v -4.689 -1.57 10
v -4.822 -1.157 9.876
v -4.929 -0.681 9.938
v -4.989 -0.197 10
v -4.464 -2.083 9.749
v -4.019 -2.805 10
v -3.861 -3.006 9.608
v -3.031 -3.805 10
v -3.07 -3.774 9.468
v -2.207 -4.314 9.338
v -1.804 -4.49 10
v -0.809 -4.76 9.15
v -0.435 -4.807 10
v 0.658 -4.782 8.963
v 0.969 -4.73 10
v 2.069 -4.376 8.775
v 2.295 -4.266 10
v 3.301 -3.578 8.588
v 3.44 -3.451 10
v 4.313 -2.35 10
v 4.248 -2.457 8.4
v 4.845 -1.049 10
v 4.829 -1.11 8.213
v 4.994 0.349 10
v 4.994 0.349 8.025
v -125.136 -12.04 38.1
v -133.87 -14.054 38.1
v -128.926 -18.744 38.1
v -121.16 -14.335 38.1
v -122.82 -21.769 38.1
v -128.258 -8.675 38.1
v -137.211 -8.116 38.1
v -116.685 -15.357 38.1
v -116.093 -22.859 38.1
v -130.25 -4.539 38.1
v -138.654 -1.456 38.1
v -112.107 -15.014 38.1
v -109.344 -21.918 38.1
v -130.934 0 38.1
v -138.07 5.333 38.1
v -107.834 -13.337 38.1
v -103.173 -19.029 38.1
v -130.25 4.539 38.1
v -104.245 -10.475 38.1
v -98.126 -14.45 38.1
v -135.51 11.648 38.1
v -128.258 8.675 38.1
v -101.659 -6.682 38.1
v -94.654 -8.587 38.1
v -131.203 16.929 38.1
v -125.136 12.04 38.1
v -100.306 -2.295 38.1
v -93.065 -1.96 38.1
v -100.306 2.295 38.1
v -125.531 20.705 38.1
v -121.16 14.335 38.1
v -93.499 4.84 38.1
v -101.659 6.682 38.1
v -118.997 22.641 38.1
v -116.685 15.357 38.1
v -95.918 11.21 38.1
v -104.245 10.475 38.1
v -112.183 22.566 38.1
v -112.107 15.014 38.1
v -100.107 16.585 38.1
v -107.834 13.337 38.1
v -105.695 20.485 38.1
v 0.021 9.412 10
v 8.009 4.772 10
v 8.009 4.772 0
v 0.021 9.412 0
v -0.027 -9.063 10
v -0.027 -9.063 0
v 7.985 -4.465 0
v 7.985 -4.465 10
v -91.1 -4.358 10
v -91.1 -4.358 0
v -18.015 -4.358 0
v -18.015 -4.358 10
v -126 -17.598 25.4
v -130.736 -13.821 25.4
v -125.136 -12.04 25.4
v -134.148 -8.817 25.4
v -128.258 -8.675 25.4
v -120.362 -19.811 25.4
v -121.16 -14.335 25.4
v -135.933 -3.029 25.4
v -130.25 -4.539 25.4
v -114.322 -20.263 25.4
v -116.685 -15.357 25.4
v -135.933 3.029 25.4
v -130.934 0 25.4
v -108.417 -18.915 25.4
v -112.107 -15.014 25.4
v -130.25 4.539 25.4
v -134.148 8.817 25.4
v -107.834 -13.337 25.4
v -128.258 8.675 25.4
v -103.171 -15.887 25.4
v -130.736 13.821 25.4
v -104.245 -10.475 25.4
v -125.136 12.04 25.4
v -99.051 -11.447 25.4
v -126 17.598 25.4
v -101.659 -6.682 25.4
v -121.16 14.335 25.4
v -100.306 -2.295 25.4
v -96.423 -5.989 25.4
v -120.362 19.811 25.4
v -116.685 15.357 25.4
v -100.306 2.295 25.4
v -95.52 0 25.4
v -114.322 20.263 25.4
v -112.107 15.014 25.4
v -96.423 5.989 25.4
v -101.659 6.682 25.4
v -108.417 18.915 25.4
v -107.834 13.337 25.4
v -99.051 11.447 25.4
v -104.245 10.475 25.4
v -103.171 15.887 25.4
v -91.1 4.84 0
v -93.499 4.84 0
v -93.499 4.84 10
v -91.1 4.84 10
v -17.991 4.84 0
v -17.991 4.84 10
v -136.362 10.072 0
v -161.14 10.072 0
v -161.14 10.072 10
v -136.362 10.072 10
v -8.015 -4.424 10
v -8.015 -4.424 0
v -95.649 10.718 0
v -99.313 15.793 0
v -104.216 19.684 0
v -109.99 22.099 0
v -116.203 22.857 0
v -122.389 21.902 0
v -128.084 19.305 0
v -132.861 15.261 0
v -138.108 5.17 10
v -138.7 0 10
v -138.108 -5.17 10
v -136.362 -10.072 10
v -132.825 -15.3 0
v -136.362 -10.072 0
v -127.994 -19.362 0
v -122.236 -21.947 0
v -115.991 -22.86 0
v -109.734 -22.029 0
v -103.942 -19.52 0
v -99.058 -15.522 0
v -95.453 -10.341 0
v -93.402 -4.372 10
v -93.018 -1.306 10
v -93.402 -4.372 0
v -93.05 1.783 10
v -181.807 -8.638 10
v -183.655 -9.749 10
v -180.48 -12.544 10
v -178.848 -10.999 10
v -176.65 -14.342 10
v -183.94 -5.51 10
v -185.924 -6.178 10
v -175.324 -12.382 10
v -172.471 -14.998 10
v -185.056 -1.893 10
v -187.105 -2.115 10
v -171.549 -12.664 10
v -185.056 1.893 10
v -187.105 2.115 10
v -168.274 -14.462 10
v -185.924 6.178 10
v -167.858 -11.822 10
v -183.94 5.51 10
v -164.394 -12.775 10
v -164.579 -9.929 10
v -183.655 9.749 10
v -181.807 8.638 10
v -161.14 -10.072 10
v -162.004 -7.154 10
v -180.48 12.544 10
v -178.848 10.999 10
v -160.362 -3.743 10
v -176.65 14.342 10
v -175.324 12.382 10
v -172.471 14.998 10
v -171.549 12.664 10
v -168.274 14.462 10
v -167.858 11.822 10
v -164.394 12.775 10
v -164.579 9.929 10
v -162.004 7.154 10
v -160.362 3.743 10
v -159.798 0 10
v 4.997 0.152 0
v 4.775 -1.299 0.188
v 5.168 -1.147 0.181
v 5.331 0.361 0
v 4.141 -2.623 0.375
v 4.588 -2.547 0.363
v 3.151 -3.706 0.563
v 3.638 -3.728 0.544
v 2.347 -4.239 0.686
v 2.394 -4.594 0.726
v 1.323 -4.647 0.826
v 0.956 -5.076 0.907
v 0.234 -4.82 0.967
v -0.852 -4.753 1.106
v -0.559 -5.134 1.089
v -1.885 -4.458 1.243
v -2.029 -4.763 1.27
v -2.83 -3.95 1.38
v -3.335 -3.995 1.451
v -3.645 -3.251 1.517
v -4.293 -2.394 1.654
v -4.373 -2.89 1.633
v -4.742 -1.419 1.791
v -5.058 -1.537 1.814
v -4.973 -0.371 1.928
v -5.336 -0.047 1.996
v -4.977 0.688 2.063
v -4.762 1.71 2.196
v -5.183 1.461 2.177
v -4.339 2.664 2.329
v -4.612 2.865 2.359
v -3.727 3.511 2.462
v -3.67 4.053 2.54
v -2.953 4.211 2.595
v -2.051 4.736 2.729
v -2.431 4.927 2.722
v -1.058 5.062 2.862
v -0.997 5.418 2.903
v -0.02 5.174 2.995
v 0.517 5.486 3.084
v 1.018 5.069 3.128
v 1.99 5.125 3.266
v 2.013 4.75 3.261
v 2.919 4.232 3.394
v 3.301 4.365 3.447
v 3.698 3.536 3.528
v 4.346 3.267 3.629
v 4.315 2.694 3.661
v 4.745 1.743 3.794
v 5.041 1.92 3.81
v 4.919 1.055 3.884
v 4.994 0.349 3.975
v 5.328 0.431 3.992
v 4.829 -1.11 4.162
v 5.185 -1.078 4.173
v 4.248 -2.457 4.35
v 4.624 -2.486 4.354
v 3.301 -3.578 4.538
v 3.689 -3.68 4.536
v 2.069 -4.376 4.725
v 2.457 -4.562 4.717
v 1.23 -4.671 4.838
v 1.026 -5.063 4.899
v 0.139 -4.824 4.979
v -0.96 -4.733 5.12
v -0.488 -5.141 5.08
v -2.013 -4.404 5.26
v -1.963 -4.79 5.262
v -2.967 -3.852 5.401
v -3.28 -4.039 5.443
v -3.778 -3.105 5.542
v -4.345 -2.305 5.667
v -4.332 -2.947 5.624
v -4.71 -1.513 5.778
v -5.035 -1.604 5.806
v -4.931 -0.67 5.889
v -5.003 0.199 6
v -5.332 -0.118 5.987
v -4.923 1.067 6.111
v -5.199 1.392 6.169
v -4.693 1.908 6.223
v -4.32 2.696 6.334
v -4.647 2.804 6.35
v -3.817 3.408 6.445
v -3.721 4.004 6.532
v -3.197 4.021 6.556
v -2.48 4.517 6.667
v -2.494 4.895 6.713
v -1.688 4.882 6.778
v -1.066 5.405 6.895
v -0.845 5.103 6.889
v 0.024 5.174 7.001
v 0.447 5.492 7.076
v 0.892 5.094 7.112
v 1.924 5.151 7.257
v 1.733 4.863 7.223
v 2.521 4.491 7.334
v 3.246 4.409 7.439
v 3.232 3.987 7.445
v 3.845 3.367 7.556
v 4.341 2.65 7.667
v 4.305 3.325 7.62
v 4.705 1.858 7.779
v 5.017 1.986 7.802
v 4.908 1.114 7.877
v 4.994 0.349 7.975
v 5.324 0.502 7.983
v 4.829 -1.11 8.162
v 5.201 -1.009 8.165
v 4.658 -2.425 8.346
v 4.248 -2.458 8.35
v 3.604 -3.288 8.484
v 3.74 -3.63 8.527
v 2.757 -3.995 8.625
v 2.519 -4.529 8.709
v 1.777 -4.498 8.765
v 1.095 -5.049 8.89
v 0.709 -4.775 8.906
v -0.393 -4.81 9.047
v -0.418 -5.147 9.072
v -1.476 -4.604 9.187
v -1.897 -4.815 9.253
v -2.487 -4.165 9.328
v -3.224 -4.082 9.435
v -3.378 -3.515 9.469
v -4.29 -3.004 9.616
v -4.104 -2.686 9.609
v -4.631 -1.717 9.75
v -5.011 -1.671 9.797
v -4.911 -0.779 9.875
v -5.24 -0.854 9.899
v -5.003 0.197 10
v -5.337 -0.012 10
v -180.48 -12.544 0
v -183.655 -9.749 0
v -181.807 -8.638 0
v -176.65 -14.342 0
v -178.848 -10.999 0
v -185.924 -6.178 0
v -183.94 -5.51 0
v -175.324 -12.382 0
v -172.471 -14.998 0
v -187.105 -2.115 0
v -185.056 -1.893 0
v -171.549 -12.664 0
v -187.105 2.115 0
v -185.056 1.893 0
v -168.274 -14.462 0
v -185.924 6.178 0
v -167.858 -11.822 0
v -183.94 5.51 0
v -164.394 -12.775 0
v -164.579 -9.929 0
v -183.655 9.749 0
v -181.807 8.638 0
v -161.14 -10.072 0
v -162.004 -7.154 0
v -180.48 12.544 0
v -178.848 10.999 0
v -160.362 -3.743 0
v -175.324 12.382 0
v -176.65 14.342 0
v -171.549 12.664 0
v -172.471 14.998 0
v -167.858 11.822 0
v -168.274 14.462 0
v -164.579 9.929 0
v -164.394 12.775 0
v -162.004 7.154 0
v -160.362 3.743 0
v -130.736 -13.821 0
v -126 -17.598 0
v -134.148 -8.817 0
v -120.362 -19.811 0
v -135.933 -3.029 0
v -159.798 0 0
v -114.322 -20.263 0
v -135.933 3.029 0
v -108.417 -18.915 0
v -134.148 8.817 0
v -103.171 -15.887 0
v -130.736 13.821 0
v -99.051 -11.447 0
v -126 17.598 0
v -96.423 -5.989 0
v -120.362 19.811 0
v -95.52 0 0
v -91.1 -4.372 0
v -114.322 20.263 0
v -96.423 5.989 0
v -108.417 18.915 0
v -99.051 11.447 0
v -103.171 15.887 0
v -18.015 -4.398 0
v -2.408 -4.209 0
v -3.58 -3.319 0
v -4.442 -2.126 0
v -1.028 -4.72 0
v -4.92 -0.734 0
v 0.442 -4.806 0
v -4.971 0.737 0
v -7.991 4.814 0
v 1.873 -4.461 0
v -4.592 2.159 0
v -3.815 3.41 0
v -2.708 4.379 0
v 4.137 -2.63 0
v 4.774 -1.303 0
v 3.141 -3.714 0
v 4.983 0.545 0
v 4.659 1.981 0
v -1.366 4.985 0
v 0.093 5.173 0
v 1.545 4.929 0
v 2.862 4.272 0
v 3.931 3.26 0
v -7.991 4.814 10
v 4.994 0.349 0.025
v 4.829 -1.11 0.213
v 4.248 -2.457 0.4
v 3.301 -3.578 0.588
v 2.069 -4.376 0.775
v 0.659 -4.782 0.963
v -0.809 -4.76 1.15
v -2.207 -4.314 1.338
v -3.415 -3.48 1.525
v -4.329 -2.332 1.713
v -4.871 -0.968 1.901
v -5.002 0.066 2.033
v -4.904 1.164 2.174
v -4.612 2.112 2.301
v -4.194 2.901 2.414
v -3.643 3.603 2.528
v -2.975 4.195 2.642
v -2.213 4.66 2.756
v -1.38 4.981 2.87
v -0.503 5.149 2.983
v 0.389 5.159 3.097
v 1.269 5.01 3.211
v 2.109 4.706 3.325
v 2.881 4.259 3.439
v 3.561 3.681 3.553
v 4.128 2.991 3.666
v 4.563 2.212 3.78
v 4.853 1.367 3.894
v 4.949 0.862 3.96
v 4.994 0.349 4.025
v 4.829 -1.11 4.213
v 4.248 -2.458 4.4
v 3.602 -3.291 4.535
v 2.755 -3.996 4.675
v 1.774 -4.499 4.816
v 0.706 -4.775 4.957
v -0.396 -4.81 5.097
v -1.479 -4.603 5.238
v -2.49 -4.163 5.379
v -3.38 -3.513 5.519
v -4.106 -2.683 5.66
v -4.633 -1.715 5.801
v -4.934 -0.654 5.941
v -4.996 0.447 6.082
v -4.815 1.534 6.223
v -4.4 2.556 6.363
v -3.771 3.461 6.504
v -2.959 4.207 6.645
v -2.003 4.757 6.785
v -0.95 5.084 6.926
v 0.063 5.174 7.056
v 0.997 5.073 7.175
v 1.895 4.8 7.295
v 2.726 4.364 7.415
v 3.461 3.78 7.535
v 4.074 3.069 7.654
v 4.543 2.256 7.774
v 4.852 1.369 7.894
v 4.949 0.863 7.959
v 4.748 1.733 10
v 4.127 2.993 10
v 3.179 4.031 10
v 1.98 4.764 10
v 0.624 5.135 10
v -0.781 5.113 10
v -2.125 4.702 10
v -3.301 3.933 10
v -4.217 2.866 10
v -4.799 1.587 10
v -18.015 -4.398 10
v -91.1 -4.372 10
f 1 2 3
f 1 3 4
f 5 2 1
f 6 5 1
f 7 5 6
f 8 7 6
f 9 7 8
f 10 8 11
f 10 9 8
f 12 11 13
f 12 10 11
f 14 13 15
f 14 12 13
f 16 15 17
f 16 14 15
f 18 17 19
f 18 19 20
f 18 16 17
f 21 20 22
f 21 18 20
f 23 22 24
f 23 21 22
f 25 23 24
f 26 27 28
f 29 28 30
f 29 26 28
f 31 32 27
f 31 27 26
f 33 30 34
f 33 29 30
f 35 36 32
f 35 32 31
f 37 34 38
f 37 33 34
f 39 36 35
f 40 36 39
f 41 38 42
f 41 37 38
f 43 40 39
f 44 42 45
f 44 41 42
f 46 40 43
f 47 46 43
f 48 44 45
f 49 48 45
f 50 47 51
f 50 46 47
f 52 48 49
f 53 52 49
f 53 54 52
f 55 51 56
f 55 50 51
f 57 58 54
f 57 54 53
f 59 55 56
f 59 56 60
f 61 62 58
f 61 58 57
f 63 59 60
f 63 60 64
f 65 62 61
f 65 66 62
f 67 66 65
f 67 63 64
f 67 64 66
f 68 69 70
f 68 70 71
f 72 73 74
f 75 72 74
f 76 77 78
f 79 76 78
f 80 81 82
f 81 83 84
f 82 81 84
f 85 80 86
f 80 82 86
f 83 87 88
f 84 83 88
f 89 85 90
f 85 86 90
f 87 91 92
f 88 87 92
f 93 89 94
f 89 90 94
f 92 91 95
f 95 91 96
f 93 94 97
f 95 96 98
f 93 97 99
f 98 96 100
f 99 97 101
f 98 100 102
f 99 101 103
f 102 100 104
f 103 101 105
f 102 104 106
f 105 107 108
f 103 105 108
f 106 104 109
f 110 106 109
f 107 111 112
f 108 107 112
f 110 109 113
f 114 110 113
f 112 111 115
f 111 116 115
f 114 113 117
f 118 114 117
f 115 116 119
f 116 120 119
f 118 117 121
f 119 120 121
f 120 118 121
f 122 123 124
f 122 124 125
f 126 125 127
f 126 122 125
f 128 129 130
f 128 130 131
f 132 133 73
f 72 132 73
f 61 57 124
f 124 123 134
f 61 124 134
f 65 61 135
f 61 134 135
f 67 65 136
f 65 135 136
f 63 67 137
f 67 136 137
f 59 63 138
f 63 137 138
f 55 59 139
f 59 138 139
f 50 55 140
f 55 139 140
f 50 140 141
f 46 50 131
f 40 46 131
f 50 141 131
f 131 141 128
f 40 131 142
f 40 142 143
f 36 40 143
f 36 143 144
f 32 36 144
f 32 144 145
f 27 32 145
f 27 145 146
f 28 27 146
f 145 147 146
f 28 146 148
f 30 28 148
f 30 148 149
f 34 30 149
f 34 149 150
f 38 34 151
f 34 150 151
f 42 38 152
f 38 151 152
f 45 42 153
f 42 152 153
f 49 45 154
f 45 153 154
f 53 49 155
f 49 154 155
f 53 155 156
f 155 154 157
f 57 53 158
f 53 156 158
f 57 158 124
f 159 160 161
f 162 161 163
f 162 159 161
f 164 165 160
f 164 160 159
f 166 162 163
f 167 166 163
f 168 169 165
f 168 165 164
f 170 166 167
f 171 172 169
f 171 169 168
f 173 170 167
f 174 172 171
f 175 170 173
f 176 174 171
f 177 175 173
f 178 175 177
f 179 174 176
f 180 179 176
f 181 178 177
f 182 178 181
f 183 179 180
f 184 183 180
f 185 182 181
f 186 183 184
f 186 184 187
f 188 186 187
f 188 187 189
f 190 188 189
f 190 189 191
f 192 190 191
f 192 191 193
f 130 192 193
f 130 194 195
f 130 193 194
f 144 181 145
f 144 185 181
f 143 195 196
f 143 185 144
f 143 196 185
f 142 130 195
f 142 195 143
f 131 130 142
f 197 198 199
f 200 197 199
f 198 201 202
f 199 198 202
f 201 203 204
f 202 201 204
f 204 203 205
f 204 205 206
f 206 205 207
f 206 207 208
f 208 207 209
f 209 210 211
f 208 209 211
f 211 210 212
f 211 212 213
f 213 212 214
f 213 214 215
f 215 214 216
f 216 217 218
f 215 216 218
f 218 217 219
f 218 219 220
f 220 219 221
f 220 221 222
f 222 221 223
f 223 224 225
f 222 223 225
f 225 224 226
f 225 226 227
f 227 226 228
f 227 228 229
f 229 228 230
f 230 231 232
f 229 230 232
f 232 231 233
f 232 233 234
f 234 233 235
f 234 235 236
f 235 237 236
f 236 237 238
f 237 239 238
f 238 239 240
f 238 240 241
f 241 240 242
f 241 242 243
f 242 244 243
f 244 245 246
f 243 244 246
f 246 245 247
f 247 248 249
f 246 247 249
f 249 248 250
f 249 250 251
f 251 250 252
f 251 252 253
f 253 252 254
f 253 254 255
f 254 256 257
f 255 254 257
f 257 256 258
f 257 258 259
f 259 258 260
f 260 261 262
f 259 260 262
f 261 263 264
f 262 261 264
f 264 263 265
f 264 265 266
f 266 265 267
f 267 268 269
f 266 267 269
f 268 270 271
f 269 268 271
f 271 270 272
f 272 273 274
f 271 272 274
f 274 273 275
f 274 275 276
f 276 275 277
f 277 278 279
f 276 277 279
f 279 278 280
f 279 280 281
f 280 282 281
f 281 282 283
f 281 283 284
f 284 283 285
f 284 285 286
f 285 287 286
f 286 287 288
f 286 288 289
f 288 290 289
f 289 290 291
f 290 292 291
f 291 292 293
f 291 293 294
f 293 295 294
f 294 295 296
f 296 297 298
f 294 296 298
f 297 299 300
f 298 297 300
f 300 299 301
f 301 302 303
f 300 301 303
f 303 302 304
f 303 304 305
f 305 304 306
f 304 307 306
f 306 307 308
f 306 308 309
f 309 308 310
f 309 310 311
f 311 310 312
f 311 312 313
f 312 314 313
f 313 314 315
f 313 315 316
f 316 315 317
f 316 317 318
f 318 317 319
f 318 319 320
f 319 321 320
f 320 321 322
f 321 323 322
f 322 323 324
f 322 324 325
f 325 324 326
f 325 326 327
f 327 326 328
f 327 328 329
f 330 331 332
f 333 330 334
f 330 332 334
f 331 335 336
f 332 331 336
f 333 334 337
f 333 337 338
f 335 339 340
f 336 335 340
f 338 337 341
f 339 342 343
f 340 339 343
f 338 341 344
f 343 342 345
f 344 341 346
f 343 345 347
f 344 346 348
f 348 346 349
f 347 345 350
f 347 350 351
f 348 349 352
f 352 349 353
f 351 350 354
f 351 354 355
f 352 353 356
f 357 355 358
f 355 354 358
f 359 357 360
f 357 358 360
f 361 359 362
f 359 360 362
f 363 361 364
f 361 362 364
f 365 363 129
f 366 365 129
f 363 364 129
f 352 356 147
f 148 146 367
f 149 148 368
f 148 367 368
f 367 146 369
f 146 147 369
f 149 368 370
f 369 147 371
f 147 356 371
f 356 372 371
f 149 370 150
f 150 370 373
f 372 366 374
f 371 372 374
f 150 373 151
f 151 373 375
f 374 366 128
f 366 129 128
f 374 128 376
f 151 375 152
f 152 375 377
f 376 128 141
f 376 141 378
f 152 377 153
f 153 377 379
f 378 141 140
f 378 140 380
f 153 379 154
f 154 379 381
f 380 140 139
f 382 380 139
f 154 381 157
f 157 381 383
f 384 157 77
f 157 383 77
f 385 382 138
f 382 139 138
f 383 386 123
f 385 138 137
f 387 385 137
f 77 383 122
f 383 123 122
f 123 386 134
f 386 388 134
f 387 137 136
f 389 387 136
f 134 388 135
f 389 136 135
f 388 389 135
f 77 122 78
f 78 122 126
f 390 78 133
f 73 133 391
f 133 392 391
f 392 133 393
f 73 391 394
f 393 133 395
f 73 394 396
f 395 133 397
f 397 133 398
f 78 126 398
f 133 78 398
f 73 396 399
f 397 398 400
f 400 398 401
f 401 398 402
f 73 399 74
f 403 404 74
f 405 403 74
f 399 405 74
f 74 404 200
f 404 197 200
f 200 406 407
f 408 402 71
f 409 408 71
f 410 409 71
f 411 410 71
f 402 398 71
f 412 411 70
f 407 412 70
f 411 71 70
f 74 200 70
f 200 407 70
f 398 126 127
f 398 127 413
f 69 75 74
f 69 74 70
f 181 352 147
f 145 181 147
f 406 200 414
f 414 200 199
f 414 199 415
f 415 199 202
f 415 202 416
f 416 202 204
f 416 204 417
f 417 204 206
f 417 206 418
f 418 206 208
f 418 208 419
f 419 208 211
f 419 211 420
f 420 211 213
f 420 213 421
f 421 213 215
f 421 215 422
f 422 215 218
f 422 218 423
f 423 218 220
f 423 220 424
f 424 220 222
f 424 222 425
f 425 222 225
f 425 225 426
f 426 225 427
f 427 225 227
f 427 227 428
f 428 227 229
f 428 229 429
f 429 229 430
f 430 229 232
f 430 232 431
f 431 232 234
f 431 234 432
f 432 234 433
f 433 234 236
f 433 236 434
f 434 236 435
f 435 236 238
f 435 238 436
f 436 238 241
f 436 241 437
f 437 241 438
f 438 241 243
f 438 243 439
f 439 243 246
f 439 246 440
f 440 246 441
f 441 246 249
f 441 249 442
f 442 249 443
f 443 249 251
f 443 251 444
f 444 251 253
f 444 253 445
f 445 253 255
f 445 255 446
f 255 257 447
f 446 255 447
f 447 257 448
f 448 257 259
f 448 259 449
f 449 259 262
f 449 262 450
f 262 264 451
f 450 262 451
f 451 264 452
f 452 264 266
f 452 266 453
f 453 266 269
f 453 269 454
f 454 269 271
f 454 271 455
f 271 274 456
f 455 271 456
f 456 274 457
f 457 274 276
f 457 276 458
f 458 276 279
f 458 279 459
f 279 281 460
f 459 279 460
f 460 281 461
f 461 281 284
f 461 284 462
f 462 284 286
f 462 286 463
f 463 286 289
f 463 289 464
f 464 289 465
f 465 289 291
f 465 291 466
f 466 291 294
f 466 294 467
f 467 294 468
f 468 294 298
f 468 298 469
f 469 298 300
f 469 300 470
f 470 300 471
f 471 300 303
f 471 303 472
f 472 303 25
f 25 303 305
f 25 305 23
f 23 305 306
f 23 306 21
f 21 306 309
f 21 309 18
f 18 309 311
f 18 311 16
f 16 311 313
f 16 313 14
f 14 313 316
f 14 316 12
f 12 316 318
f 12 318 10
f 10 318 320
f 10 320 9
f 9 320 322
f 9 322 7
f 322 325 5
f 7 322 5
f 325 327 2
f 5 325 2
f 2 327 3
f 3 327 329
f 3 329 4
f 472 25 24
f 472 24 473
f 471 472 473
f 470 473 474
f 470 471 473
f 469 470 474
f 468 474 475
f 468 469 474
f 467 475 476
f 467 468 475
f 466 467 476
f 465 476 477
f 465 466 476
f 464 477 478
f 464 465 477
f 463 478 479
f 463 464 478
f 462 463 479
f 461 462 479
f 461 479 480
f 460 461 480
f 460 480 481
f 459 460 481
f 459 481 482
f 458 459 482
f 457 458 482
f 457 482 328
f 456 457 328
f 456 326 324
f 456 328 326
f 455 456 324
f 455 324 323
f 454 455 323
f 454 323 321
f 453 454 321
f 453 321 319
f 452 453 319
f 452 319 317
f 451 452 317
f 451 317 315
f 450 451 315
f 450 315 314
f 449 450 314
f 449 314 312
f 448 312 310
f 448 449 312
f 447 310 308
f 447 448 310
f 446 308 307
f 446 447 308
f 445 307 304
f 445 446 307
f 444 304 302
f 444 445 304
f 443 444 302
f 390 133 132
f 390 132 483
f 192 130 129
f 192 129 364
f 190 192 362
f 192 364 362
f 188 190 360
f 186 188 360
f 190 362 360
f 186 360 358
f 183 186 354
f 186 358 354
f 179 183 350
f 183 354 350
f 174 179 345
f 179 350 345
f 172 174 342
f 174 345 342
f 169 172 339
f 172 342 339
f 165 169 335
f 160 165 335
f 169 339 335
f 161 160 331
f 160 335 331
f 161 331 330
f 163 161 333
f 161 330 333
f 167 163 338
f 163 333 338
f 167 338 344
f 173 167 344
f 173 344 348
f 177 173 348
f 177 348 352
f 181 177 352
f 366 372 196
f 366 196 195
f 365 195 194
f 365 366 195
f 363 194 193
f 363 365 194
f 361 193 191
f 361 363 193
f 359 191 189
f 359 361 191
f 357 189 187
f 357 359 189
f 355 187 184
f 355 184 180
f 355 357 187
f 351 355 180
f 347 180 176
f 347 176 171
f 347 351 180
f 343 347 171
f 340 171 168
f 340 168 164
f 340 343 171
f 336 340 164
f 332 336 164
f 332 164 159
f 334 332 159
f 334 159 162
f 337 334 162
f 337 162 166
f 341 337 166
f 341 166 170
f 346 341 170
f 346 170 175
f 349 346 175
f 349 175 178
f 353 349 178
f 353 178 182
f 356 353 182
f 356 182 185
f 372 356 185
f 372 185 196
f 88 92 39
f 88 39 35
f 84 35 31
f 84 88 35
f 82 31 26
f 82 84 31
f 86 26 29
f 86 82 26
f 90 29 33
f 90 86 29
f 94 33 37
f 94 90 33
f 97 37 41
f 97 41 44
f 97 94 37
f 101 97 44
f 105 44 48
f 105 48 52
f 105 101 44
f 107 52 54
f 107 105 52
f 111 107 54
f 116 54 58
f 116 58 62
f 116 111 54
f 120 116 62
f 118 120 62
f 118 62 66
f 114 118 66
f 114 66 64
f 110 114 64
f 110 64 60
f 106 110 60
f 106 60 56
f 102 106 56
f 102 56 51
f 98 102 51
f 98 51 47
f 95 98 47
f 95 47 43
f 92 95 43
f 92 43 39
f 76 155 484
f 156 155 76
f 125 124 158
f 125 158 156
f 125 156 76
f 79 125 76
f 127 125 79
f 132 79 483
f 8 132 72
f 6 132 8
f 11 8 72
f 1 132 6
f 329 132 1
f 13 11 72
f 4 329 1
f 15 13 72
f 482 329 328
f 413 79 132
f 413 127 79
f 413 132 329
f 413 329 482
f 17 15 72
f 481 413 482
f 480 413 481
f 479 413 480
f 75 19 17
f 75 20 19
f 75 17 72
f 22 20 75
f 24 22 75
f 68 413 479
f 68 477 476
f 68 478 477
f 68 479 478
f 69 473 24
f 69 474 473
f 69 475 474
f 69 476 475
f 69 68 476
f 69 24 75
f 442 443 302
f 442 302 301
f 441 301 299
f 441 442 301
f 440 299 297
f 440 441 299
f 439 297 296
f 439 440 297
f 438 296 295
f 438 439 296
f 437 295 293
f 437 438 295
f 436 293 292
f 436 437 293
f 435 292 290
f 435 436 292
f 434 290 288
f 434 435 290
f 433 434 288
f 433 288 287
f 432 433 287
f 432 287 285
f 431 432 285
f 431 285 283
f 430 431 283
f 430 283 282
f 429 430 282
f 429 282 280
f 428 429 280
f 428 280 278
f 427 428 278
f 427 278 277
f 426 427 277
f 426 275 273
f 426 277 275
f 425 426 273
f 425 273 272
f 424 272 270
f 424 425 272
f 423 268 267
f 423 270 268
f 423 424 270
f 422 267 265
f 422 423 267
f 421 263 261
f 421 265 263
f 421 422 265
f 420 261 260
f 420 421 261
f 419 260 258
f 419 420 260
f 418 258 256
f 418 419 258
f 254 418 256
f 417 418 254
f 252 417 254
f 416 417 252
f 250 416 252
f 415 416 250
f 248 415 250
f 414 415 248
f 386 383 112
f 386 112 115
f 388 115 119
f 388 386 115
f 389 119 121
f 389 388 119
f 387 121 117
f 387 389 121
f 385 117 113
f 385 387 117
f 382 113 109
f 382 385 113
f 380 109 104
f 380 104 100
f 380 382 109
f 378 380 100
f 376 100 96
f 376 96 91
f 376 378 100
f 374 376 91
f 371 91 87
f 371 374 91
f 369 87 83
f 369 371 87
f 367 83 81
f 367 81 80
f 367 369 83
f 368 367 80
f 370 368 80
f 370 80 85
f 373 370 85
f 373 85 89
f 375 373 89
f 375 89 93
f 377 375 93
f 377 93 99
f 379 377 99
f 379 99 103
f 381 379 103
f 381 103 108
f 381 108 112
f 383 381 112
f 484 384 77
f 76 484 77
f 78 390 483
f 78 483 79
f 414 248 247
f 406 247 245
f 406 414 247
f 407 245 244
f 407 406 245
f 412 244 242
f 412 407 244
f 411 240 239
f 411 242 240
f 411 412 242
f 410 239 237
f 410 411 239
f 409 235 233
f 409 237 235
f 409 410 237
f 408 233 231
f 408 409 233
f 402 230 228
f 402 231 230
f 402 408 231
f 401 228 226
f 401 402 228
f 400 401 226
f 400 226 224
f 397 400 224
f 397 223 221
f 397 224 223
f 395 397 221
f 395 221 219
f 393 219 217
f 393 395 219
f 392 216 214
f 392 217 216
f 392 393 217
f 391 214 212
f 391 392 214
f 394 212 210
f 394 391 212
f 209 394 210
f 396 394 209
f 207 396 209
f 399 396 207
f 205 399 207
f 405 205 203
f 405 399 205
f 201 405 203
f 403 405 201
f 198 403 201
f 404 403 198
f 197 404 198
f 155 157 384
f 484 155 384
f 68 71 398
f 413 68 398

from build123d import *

# Parameters (mm, degrees)
BOSS_EXTRUDE1_DEPTH     = 10
CUT_EXTRUDE1_DEPTH      = 10
CUT_EXTRUDE1_DEPTH_BACK = 10
SKETCH2_R               = 5
CUT_SWEEP1_PITCH        = 4
CUT_SWEEP1_HEIGHT       = 10
CUT_SWEEP1_RADIUS       = 5
EXTRUDE_THIN2_DEPTH     = 10
BODY_MOVE_COPY1_ANGLE   = 2
SKETCH10_W              = 73.109037791
SKETCH10_H              = 9.197874715
BOSS_EXTRUDE2_DEPTH     = 10
SKETCH14_W              = 2.398597497
SKETCH14_H              = 9.211550244
BOSS_EXTRUDE7_DEPTH     = 10
SKETCH14_3_R            = 22.86
BOSS_EXTRUDE8_DEPTH     = 38.1
CUT_EXTRUDE2_DEPTH      = 25.4
CUT_EXTRUDE2_DEPTH_BACK = 38.1
SKETCH15_R              = 20.32
CUT_EXTRUDE3_DEPTH      = 38.1
CUT_EXTRUDE3_DEPTH_BACK = 38.1
SKETCH16_R              = 15.4
SKETCH17_W              = 25.201116709
SKETCH17_H              = 20.14431591
BOSS_EXTRUDE9_DEPTH     = 10
SKETCH19_R              = 15
BOSS_EXTRUDE10_DEPTH    = 10
CUT_EXTRUDE4_DEPTH      = 10
CUT_EXTRUDE4_DEPTH_BACK = 10
SKETCH20_R              = 12.7


with BuildPart() as part:
    # Sketch1 → Boss-Extrude1 (new body)
    with BuildSketch(Plane.XY):
        Polygon((-8.167579482, -4.315550803), (-0.346413115, -9.231106721), (7.821166368, -4.915555918), (8.167579482, 4.315550803), (0.346413115, 9.231106721), (-7.821166368, 4.915555918), align=None)
    extrude(amount=BOSS_EXTRUDE1_DEPTH)

    # Sketch2 → Cut-Extrude1 (cut, two sides: drawn at the far end of the back side and taken through both)
    with BuildSketch(Plane.XY.offset(-CUT_EXTRUDE1_DEPTH_BACK)):
        Circle(SKETCH2_R)
    extrude(amount=CUT_EXTRUDE1_DEPTH + CUT_EXTRUDE1_DEPTH_BACK, mode=Mode.SUBTRACT)

    # Cut-Sweep1: sweep along a helix
    with BuildLine() as cut_sweep1_path:
        Helix(CUT_SWEEP1_PITCH, CUT_SWEEP1_HEIGHT, CUT_SWEEP1_RADIUS, center=(0, 0, 0), direction=(0, 0, 1), lefthand=True)
    # Sketch4 → Cut-Sweep1 (sweep, cut)
    with BuildSketch(Plane.XY):
        Polygon((5.337109255, 0), (4.831445373, 0.291945178), (4.831445373, -0.291945178), align=None)
    sweep(path=cut_sweep1_path.line, is_frenet=True, mode=Mode.SUBTRACT)

    # Sketch6 → Extrude-Thin2 (add)
    with BuildSketch(Plane.XY):
        Polygon((-7.821166368, 4.915555918), (-8.167579482, -4.315550803), (-18.160545639, -3.940547606), (-17.814132524, 5.290559115), align=None)
    extrude(amount=EXTRUDE_THIN2_DEPTH)


with BuildPart() as part_1:
    # Body-Move/Copy1: moved
    add(part.part.rotate(Axis((-4.996483078, 0, 0), (0, 0, 1)), BODY_MOVE_COPY1_ANGLE))

    # Sketch10 → Boss-Extrude2 (add)
    with BuildSketch(Plane.XY):
        with Locations((-54.545481105, 0.241069377)):
            Rectangle(SKETCH10_W, SKETCH10_H)
    extrude(amount=BOSS_EXTRUDE2_DEPTH)

    # Sketch14 → Boss-Extrude7 (add)
    with BuildSketch(Plane.XY):
        with Locations((-92.299298749, 0.234231612)):
            Rectangle(SKETCH14_W, SKETCH14_H)
    extrude(amount=BOSS_EXTRUDE7_DEPTH)

    # Sketch14<3> → Boss-Extrude8 (add)
    with BuildSketch(Plane.XY):
        with Locations(Location((-115.84035067, 0, 0), (0, 0, 12.223392191))):
            Circle(SKETCH14_3_R)
    extrude(amount=BOSS_EXTRUDE8_DEPTH)

    # Sketch15 → Cut-Extrude2 (cut, two sides: drawn at the far end of the back side and taken through both)
    with BuildSketch(Plane.XY.offset(-CUT_EXTRUDE2_DEPTH_BACK)):
        with Locations((-115.84035067, 0)):
            Circle(SKETCH15_R)
    extrude(amount=CUT_EXTRUDE2_DEPTH + CUT_EXTRUDE2_DEPTH_BACK, mode=Mode.SUBTRACT)

    # Sketch16 → Cut-Extrude3 (cut, two sides: drawn at the far end of the back side and taken through both)
    with BuildSketch(Plane.XY.offset(-CUT_EXTRUDE3_DEPTH_BACK)):
        with Locations(Location((-115.534237584, 0, 0), (0, 0, 180))):
            Circle(SKETCH16_R)
    extrude(amount=CUT_EXTRUDE3_DEPTH + CUT_EXTRUDE3_DEPTH_BACK, mode=Mode.SUBTRACT)

    # Sketch17 → Boss-Extrude9 (add)
    with BuildSketch(Plane.XY):
        with Locations((-148.962391284, 0)):
            Rectangle(SKETCH17_W, SKETCH17_H)
    extrude(amount=BOSS_EXTRUDE9_DEPTH)

    # Sketch19 → Boss-Extrude10 (add)
    with BuildSketch(Plane.XY):
        with Locations((-172.255338782, 0)):
            Circle(SKETCH19_R)
    extrude(amount=BOSS_EXTRUDE10_DEPTH)

    # Sketch20 → Cut-Extrude4 (cut, two sides: drawn at the far end of the back side and taken through both)
    with BuildSketch(Plane.XY.offset(-CUT_EXTRUDE4_DEPTH_BACK)):
        with Locations((-172.49769937, 0)):
            Circle(SKETCH20_R)
    extrude(amount=CUT_EXTRUDE4_DEPTH + CUT_EXTRUDE4_DEPTH_BACK, mode=Mode.SUBTRACT)


solid = part_1.part
